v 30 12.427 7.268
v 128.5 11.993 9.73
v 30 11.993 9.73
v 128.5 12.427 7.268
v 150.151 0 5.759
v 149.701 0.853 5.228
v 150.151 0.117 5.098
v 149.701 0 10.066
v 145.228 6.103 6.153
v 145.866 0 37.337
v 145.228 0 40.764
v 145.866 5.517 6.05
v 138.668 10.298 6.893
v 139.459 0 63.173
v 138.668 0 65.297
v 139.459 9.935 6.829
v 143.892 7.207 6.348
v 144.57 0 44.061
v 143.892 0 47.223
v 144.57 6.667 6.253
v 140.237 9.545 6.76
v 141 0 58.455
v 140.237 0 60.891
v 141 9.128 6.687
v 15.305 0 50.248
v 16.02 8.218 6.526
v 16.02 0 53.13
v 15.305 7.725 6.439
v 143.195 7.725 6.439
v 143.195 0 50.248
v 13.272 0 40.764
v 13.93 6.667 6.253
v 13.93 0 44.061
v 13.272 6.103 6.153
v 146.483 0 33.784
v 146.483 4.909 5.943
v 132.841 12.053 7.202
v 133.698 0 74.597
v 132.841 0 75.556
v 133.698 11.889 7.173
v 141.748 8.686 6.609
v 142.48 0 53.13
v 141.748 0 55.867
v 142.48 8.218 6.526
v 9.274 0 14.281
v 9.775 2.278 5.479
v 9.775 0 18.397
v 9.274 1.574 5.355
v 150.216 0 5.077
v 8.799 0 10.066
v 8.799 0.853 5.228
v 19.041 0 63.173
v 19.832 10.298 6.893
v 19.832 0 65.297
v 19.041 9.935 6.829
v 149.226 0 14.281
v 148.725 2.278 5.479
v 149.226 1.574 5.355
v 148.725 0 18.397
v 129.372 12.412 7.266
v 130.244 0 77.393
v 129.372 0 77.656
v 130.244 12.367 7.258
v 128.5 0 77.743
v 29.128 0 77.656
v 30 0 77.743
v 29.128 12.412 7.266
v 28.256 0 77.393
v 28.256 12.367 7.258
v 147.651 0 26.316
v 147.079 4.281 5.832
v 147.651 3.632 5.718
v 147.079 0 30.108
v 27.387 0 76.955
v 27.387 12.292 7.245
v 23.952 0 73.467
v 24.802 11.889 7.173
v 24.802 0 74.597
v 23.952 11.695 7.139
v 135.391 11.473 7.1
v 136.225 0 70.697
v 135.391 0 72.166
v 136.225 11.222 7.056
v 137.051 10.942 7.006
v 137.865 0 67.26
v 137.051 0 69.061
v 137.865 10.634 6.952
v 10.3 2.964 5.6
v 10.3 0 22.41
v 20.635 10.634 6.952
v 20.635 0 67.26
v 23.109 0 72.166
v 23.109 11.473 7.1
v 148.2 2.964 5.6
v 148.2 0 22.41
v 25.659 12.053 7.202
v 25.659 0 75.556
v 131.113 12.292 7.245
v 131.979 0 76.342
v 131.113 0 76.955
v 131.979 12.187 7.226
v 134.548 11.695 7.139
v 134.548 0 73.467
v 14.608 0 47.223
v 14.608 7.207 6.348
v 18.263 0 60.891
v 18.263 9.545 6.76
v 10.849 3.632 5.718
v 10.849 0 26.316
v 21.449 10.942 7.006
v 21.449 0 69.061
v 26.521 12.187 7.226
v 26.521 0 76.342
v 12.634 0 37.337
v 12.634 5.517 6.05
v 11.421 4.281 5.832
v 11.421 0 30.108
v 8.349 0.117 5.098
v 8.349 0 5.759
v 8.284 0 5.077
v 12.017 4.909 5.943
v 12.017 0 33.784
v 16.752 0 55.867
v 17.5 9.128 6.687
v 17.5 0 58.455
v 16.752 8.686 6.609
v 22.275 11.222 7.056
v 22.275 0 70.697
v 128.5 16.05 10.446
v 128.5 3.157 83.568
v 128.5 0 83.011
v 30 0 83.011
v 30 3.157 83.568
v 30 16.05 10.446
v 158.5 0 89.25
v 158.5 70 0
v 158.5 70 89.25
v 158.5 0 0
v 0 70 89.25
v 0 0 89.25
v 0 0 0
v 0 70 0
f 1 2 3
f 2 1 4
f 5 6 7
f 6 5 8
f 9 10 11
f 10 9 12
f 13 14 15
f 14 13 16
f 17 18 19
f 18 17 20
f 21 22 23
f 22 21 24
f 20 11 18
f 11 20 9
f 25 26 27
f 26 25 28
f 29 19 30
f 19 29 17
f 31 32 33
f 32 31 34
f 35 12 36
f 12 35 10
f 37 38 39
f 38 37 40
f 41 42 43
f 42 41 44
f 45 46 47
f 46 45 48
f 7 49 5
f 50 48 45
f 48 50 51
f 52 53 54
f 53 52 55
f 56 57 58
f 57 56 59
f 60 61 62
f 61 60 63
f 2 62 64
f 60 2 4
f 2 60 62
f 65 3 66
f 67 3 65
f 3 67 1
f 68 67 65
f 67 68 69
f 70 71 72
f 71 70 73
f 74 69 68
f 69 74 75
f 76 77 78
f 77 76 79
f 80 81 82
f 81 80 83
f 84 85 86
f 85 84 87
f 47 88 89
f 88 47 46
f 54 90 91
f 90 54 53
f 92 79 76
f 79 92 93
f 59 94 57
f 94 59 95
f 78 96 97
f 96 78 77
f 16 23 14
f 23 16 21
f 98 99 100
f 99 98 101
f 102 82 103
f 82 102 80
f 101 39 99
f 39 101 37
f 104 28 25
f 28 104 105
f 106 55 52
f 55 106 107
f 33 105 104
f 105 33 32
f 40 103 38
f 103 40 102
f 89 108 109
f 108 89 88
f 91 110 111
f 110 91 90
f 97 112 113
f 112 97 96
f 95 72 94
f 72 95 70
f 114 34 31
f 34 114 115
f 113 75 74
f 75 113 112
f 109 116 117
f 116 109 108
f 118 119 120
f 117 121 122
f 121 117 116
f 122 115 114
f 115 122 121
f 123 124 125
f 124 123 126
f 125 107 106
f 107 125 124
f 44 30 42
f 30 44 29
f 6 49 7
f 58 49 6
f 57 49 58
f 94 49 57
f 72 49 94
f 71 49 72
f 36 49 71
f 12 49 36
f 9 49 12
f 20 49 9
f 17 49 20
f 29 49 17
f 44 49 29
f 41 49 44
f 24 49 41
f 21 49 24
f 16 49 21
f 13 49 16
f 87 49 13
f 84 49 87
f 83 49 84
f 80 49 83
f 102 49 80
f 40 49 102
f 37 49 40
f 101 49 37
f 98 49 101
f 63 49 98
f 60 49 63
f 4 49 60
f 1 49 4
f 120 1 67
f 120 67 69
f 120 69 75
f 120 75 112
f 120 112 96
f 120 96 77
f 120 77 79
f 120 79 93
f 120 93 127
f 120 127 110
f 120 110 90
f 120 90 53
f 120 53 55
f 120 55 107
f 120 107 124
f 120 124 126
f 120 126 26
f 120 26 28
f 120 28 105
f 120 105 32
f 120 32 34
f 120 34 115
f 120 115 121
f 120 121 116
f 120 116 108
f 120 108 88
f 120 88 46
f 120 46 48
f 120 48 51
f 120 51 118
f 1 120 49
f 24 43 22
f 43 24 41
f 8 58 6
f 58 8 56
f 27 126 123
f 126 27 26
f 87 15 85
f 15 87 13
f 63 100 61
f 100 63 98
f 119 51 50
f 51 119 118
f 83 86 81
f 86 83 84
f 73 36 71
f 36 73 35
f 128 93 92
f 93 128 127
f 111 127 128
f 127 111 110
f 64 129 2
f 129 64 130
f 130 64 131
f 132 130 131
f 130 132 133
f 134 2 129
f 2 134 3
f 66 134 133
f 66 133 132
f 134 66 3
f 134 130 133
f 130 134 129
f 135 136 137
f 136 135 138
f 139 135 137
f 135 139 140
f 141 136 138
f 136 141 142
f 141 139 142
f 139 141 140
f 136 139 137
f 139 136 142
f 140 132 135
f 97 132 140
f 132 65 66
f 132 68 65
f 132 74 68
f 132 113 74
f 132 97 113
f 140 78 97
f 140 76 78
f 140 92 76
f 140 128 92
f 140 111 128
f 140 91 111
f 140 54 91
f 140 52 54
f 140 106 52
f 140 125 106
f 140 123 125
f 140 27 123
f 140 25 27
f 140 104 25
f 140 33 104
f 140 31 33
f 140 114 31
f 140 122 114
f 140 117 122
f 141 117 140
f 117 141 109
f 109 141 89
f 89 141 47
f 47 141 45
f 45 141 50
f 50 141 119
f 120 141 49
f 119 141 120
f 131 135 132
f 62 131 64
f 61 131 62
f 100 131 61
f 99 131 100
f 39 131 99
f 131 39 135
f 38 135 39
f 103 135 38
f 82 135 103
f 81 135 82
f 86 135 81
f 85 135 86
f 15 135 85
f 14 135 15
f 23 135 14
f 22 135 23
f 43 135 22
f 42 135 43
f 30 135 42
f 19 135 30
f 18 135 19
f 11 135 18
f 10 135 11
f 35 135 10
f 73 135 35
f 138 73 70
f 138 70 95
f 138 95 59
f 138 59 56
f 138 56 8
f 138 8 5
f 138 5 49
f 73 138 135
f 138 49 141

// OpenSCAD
// Heater dimensions
heater_width = 148.5;
heater_depth = 79.25;
corner_radius = 25;  // Corner radius on the sides of the heater

// Stand parameters
stand_height = 60;
tilt_angle = 10;
cutout_depth = 10;  // How deep the heater sits into the stand
wall_margin = 5;  // Extra material around the heater
stand_width = heater_width+wall_margin*2;
stand_depth = heater_depth+wall_margin*2;

$fn = 180;

module heater_cutout() {
  union() {
    translate([corner_radius, 0, 0])
    hull() {
        translate([0, 0, 0])
        cylinder(r=corner_radius, h=heater_depth);

        translate([heater_width-(corner_radius*2), 0, 0])
        cylinder(r=corner_radius, h=heater_depth);

        translate([0, heater_width-(corner_radius*2), 0])
        cylinder(r=corner_radius, h=heater_depth);

        translate([heater_width-(corner_radius*2), heater_width-(corner_radius*2), 0])
        cylinder(r=corner_radius, h=heater_depth);
    }

    translate([corner_radius, heater_width-corner_radius, wall_margin/2])
    cube([heater_width-corner_radius*2, 4.12, heater_depth-wall_margin]);
  }
}

// Main stand
difference() {
    cube([stand_width, stand_height+cutout_depth, stand_depth]);
    rotate([tilt_angle, 0, 0])
    translate([wall_margin, -110, wall_margin])
    heater_cutout();
}
